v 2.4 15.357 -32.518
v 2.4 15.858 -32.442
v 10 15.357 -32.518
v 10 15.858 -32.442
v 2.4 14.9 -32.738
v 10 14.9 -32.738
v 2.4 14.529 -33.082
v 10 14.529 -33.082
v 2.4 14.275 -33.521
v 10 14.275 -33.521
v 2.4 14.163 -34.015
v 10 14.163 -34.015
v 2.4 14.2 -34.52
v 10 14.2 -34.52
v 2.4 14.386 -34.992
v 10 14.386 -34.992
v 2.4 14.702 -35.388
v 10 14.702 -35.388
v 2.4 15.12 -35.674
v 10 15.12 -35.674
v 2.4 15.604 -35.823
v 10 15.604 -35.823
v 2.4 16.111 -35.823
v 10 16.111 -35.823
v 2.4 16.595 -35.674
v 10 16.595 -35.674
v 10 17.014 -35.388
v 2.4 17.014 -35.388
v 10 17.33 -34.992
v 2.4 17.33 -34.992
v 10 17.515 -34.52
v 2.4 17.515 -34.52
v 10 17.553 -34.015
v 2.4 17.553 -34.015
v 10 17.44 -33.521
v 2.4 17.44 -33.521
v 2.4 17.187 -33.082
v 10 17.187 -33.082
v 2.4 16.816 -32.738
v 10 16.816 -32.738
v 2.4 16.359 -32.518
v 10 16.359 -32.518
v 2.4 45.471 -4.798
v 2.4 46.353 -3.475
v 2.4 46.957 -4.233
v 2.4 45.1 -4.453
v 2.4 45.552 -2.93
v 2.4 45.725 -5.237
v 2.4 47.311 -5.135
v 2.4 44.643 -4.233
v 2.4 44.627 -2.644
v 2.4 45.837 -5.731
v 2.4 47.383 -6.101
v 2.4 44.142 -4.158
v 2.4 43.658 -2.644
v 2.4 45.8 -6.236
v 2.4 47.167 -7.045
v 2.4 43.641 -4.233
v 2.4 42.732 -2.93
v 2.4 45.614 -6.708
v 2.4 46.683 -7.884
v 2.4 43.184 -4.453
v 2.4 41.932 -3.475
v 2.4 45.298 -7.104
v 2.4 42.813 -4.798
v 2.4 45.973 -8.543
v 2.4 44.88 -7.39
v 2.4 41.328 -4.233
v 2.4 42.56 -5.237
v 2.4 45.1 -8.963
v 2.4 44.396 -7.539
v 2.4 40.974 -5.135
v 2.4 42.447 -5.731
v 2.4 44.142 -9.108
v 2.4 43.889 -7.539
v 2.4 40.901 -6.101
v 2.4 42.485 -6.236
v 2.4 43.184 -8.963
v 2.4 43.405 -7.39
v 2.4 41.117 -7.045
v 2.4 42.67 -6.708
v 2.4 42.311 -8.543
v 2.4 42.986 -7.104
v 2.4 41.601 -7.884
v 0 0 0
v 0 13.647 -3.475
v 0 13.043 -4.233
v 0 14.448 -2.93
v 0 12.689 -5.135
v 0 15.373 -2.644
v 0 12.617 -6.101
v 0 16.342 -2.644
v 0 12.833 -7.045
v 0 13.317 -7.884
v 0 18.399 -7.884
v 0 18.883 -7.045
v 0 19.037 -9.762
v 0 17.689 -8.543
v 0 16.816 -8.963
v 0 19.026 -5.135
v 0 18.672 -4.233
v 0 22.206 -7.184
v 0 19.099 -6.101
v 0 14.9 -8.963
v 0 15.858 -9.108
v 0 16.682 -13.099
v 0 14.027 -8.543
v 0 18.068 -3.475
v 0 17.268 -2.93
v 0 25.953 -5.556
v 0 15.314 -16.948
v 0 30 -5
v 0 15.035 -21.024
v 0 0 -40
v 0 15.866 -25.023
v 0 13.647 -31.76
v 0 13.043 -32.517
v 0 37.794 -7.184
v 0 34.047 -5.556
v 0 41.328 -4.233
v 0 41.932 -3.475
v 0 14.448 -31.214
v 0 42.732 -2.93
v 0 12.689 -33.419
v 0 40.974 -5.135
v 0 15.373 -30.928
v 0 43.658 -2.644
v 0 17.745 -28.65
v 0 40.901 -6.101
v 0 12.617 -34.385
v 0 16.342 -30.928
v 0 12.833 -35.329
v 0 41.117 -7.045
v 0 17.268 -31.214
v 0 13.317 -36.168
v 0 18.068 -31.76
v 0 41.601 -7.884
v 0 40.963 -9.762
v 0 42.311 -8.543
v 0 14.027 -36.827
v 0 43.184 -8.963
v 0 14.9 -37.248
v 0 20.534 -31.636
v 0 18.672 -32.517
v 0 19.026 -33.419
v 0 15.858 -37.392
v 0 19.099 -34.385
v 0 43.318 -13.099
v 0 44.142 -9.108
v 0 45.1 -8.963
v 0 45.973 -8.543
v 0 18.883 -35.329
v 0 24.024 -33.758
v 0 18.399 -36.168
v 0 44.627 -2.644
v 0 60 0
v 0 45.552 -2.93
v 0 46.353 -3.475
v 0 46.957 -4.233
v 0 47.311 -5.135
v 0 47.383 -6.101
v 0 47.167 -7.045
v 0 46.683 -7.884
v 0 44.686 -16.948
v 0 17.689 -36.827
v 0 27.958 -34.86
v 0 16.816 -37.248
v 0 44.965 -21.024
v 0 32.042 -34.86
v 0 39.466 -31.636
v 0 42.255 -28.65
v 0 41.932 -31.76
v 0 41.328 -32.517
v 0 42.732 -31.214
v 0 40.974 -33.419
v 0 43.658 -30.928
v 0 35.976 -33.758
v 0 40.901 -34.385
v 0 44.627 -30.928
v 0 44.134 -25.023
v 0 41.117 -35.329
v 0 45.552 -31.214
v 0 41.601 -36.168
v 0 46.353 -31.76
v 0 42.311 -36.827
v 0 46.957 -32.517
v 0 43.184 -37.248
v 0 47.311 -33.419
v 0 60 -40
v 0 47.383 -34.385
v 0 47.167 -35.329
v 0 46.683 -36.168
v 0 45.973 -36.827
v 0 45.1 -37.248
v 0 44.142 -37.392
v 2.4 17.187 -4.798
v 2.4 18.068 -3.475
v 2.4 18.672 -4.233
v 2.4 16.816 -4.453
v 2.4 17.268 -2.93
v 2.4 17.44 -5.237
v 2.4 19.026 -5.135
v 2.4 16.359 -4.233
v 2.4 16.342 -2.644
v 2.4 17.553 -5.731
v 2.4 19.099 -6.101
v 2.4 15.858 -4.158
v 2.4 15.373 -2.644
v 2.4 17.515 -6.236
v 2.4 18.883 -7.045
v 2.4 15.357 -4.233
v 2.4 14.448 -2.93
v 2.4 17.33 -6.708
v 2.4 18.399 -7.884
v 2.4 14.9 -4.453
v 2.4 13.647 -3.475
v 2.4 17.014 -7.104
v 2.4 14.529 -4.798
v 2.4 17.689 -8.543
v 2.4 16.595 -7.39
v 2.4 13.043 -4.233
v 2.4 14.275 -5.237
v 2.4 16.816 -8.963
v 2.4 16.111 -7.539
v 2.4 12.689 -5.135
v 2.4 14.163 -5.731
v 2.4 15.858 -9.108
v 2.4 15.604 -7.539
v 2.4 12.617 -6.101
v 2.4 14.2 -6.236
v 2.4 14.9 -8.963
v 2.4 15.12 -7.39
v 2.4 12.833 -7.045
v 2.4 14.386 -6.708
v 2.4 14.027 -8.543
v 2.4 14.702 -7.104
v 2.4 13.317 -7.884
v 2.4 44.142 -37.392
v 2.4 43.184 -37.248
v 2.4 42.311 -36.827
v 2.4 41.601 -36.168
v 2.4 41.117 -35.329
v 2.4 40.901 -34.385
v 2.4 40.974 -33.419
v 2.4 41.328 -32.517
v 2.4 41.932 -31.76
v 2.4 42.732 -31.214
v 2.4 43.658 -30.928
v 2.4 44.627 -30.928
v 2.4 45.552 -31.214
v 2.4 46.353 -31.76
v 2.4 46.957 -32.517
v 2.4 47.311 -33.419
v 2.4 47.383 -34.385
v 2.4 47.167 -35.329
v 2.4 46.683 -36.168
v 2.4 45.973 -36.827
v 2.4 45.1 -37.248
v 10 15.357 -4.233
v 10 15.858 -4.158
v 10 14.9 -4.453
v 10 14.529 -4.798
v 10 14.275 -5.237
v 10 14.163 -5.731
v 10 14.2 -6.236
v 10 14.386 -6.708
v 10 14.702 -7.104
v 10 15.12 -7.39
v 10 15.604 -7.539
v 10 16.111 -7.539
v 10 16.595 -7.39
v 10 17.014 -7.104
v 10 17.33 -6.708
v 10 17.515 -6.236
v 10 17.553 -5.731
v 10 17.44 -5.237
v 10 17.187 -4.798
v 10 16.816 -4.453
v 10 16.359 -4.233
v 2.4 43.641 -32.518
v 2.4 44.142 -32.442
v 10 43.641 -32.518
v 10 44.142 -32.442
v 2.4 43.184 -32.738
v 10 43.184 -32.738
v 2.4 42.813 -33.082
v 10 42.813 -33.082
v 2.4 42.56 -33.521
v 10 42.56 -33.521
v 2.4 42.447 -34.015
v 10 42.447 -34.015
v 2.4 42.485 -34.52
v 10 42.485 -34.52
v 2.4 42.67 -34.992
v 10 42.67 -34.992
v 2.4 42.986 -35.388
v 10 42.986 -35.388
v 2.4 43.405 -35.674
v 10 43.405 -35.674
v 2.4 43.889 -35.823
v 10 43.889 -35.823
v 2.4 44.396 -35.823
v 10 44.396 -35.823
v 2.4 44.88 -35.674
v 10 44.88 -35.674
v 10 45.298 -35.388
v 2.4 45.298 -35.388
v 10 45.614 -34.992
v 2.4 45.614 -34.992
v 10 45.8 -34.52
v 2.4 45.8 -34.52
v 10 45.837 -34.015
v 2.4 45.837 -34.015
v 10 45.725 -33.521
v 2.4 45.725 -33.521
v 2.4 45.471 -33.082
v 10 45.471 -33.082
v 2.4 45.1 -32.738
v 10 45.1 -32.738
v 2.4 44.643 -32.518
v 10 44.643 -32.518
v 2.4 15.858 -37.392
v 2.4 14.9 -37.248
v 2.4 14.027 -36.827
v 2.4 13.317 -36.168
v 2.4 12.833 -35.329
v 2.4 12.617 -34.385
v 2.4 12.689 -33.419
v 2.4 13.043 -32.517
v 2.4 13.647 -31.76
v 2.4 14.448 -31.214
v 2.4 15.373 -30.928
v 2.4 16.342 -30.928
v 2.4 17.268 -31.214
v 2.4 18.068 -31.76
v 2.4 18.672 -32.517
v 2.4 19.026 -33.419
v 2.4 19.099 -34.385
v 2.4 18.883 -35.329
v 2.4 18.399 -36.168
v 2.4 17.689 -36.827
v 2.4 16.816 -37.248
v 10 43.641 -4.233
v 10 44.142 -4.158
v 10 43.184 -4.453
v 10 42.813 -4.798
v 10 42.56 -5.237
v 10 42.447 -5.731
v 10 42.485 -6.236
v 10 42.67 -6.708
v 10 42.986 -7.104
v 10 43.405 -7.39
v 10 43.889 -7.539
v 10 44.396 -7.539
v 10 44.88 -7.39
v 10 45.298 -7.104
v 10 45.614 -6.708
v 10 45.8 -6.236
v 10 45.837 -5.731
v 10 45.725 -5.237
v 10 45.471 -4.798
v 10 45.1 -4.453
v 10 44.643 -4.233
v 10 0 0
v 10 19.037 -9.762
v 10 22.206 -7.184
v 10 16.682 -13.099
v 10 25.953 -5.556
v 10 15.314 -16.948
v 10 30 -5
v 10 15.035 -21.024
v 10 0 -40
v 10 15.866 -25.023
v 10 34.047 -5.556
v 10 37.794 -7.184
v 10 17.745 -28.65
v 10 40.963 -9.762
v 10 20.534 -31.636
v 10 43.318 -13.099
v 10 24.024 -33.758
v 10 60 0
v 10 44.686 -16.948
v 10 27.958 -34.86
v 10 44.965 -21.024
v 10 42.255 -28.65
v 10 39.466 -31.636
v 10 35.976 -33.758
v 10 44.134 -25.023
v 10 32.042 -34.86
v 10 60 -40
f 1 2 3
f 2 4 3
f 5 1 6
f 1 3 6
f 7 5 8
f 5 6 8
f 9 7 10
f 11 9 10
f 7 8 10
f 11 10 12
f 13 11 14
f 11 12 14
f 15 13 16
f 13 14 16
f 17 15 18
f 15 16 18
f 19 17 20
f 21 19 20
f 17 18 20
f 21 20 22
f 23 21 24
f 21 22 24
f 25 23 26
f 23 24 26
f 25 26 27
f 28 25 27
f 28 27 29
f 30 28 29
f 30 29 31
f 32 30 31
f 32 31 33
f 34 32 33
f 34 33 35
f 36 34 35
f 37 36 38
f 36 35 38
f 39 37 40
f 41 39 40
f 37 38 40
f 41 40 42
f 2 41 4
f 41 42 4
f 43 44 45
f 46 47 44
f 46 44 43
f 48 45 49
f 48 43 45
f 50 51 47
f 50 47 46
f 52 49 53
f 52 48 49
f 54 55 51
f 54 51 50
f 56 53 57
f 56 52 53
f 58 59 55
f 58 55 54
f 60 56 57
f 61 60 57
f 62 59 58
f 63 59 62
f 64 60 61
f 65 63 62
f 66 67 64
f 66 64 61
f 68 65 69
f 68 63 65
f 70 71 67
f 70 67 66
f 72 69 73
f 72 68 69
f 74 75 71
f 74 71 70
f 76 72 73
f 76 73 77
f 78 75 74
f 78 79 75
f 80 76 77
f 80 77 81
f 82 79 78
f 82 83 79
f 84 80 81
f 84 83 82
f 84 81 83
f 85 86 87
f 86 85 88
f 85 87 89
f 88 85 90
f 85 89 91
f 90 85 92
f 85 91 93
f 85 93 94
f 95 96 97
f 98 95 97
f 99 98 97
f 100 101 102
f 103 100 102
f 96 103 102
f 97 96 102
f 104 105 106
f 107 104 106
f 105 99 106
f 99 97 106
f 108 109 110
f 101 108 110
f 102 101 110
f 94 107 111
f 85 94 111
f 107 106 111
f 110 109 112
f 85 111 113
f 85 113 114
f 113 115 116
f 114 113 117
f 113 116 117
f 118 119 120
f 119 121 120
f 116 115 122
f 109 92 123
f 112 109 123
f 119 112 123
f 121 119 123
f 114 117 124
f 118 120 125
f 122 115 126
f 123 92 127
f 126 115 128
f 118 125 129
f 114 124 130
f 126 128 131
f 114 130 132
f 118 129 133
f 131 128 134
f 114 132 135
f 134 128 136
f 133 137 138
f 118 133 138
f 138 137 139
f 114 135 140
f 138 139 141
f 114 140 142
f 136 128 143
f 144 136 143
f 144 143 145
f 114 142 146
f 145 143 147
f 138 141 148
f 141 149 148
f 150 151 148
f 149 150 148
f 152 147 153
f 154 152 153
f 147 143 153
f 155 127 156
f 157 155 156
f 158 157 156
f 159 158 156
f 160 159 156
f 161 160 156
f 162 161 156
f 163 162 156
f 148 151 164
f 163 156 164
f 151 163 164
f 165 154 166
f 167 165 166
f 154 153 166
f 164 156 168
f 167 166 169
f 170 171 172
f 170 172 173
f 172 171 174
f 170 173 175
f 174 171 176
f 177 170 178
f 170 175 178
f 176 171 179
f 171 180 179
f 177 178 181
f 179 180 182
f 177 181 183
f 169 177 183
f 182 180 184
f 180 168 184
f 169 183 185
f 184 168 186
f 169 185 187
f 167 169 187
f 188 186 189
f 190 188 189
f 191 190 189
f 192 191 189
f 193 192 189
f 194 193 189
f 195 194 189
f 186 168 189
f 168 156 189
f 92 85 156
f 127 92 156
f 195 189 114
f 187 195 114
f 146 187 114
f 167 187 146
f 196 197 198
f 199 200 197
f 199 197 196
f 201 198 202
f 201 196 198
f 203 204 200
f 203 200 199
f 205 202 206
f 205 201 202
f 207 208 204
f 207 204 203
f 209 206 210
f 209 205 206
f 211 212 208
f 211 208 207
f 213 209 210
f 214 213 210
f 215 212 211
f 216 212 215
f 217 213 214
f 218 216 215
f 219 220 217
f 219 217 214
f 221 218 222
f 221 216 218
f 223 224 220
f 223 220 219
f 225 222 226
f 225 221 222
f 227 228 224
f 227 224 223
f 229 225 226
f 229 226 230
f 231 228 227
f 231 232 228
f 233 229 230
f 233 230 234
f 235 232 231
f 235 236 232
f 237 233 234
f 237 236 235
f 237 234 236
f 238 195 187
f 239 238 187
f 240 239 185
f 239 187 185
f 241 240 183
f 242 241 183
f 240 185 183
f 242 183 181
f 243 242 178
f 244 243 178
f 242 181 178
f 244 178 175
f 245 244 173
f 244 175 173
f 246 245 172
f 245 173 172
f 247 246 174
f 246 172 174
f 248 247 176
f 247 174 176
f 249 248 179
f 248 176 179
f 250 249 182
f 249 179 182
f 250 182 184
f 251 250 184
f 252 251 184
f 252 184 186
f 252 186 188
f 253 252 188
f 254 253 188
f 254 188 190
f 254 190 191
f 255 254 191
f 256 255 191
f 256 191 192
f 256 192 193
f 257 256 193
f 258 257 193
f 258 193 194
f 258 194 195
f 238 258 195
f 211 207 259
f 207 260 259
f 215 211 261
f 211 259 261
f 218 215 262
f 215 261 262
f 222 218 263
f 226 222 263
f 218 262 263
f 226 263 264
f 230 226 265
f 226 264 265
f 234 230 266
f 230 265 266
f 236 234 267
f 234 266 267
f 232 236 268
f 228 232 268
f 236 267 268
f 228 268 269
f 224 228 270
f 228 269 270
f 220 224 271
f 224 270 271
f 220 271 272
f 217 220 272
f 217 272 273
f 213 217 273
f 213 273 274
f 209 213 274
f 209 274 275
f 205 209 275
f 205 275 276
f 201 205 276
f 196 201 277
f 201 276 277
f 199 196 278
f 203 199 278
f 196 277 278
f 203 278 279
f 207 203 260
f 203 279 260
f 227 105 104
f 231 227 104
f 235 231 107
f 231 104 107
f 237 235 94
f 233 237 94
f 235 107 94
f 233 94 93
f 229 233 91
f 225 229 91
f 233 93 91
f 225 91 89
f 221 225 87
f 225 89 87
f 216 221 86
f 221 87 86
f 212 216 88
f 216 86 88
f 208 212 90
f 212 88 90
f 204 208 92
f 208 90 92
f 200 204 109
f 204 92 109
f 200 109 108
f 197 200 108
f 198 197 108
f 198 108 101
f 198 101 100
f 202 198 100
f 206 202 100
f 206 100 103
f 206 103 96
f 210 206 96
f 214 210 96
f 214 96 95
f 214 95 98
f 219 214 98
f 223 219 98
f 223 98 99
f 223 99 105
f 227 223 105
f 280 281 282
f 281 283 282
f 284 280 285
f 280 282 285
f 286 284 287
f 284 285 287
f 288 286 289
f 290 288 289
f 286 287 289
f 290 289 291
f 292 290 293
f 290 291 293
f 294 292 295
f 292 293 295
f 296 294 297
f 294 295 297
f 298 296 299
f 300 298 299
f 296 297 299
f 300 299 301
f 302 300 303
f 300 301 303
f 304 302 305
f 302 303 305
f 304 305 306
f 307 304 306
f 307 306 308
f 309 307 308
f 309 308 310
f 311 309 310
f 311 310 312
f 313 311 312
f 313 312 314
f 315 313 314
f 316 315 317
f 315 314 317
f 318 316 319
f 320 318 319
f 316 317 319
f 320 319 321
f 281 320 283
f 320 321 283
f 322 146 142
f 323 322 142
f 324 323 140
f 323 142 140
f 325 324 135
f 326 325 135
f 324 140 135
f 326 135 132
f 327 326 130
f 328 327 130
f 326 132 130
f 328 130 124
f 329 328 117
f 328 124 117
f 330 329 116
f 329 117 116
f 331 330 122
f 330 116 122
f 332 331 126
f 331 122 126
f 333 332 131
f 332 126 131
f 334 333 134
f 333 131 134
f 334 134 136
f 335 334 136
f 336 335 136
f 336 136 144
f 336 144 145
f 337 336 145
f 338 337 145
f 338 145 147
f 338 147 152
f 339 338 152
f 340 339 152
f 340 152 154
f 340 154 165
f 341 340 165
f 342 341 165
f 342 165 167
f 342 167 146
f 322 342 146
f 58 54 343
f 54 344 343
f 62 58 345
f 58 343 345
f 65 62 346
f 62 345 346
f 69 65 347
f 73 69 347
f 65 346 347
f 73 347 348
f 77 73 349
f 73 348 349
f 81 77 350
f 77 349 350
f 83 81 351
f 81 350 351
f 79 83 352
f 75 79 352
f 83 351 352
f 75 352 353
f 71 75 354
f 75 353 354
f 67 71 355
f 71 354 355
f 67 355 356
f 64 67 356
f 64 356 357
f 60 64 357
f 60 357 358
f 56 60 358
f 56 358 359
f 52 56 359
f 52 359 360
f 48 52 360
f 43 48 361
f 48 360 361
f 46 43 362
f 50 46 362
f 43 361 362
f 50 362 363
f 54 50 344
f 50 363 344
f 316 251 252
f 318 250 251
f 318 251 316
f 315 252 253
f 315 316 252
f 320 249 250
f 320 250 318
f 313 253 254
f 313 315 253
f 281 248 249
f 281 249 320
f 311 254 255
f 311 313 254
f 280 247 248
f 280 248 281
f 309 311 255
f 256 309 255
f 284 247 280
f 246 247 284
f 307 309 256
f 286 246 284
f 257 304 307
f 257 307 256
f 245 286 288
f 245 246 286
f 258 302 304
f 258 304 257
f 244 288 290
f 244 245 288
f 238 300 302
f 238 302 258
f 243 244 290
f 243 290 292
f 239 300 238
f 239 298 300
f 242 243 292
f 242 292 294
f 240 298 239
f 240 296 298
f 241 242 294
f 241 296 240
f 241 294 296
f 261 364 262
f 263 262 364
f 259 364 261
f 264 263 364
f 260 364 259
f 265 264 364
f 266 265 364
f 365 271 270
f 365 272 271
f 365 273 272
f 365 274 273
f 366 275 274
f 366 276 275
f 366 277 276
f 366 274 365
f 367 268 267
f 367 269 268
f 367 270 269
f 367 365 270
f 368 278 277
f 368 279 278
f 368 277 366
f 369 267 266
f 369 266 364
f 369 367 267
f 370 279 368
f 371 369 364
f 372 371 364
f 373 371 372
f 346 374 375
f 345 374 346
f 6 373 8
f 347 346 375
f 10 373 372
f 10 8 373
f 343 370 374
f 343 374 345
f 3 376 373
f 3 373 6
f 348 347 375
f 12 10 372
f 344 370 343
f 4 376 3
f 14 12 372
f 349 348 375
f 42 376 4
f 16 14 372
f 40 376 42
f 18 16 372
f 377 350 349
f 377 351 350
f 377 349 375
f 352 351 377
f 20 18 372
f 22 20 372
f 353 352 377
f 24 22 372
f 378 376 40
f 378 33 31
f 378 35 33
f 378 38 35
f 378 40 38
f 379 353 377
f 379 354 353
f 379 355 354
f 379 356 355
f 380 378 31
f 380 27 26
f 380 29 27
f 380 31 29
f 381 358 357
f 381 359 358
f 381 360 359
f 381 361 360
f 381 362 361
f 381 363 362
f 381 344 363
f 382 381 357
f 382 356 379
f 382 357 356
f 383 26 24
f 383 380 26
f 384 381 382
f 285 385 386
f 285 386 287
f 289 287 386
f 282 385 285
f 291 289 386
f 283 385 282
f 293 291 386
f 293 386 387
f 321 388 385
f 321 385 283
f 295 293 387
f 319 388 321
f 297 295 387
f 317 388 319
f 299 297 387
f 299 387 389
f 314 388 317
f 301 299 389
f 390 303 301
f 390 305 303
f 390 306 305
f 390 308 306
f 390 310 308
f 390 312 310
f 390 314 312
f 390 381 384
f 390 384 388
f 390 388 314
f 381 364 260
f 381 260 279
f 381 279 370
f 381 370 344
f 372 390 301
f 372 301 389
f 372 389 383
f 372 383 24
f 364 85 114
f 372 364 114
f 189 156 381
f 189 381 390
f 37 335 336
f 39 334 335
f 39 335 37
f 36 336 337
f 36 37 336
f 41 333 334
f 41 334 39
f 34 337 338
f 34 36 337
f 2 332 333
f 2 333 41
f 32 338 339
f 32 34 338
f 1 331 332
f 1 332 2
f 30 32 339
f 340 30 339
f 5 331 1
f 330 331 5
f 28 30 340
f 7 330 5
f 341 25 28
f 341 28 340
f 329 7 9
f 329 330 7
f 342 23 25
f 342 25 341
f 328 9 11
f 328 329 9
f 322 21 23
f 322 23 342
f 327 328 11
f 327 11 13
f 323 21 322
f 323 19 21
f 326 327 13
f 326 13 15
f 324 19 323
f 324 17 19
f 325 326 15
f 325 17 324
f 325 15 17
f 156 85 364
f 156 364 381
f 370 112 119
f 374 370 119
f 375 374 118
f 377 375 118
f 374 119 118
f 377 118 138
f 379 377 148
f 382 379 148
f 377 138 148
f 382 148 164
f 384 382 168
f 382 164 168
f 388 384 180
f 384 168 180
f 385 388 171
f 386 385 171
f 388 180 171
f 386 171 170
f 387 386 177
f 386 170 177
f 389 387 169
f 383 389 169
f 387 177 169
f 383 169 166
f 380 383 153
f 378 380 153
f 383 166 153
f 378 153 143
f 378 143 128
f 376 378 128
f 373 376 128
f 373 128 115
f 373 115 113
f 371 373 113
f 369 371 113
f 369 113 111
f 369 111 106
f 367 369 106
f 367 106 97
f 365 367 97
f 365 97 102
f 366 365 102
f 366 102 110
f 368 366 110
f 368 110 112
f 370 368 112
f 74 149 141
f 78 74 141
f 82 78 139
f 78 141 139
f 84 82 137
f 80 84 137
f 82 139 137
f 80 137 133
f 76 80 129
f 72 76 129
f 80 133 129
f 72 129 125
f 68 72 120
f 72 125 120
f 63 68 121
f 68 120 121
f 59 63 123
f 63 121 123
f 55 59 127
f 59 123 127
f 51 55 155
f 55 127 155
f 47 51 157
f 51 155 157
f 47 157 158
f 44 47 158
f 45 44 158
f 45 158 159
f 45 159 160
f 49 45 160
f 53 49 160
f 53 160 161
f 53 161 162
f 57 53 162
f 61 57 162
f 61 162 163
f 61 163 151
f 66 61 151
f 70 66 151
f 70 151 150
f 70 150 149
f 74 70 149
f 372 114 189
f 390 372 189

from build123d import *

# Parameters (mm, degrees)
SKETCH1_W                                            = 40
SKETCH1_H                                            = 60
BOSS_EXTRUDE1_DEPTH                                  = 10
CBORE_FOR_M3_HEX_SOCKET_THIN_HEAD_CAP_SC_D           = 3.4
CBORE_FOR_M3_HEX_SOCKET_THIN_HEAD_CAP_SC_CBORE_D     = 6.5
CBORE_FOR_M3_HEX_SOCKET_THIN_HEAD_CAP_SC_CBORE_DEPTH = 2.4
SKETCH4_R                                            = 15
CUT_EXTRUDE1_DEPTH                                   = 73.801098893


with BuildPart() as part:
    # Sketch1 → Boss-Extrude1 (new body)
    with BuildSketch(Plane(origin=(0, 0, 0), x_dir=(0, 0, -1), z_dir=(1, 0, 0))):
        with Locations((20, 30)):
            Rectangle(SKETCH1_W, SKETCH1_H)
    extrude(amount=BOSS_EXTRUDE1_DEPTH)

    # CBORE for M3 Hex Socket Thin Head Cap Screw1 (through all)
    with Locations(Plane(origin=(0, 0, 0), x_dir=(0, 0, -1), z_dir=(-1, 0, 0))):
        with Locations((5.857864376, -15.857864376), (5.857864376, -44.142135624), (34.142135624, -44.142135624), (34.142135624, -15.857864376)):
            CounterBoreHole(CBORE_FOR_M3_HEX_SOCKET_THIN_HEAD_CAP_SC_D / 2, CBORE_FOR_M3_HEX_SOCKET_THIN_HEAD_CAP_SC_CBORE_D / 2, CBORE_FOR_M3_HEX_SOCKET_THIN_HEAD_CAP_SC_CBORE_DEPTH)

    # Sketch4 → Cut-Extrude1 (cut, through all)
    with BuildSketch(Plane.ZY):
        with Locations((-20, 30)):
            Circle(SKETCH4_R)
    extrude(amount=-CUT_EXTRUDE1_DEPTH, mode=Mode.SUBTRACT)


solid = part.part
